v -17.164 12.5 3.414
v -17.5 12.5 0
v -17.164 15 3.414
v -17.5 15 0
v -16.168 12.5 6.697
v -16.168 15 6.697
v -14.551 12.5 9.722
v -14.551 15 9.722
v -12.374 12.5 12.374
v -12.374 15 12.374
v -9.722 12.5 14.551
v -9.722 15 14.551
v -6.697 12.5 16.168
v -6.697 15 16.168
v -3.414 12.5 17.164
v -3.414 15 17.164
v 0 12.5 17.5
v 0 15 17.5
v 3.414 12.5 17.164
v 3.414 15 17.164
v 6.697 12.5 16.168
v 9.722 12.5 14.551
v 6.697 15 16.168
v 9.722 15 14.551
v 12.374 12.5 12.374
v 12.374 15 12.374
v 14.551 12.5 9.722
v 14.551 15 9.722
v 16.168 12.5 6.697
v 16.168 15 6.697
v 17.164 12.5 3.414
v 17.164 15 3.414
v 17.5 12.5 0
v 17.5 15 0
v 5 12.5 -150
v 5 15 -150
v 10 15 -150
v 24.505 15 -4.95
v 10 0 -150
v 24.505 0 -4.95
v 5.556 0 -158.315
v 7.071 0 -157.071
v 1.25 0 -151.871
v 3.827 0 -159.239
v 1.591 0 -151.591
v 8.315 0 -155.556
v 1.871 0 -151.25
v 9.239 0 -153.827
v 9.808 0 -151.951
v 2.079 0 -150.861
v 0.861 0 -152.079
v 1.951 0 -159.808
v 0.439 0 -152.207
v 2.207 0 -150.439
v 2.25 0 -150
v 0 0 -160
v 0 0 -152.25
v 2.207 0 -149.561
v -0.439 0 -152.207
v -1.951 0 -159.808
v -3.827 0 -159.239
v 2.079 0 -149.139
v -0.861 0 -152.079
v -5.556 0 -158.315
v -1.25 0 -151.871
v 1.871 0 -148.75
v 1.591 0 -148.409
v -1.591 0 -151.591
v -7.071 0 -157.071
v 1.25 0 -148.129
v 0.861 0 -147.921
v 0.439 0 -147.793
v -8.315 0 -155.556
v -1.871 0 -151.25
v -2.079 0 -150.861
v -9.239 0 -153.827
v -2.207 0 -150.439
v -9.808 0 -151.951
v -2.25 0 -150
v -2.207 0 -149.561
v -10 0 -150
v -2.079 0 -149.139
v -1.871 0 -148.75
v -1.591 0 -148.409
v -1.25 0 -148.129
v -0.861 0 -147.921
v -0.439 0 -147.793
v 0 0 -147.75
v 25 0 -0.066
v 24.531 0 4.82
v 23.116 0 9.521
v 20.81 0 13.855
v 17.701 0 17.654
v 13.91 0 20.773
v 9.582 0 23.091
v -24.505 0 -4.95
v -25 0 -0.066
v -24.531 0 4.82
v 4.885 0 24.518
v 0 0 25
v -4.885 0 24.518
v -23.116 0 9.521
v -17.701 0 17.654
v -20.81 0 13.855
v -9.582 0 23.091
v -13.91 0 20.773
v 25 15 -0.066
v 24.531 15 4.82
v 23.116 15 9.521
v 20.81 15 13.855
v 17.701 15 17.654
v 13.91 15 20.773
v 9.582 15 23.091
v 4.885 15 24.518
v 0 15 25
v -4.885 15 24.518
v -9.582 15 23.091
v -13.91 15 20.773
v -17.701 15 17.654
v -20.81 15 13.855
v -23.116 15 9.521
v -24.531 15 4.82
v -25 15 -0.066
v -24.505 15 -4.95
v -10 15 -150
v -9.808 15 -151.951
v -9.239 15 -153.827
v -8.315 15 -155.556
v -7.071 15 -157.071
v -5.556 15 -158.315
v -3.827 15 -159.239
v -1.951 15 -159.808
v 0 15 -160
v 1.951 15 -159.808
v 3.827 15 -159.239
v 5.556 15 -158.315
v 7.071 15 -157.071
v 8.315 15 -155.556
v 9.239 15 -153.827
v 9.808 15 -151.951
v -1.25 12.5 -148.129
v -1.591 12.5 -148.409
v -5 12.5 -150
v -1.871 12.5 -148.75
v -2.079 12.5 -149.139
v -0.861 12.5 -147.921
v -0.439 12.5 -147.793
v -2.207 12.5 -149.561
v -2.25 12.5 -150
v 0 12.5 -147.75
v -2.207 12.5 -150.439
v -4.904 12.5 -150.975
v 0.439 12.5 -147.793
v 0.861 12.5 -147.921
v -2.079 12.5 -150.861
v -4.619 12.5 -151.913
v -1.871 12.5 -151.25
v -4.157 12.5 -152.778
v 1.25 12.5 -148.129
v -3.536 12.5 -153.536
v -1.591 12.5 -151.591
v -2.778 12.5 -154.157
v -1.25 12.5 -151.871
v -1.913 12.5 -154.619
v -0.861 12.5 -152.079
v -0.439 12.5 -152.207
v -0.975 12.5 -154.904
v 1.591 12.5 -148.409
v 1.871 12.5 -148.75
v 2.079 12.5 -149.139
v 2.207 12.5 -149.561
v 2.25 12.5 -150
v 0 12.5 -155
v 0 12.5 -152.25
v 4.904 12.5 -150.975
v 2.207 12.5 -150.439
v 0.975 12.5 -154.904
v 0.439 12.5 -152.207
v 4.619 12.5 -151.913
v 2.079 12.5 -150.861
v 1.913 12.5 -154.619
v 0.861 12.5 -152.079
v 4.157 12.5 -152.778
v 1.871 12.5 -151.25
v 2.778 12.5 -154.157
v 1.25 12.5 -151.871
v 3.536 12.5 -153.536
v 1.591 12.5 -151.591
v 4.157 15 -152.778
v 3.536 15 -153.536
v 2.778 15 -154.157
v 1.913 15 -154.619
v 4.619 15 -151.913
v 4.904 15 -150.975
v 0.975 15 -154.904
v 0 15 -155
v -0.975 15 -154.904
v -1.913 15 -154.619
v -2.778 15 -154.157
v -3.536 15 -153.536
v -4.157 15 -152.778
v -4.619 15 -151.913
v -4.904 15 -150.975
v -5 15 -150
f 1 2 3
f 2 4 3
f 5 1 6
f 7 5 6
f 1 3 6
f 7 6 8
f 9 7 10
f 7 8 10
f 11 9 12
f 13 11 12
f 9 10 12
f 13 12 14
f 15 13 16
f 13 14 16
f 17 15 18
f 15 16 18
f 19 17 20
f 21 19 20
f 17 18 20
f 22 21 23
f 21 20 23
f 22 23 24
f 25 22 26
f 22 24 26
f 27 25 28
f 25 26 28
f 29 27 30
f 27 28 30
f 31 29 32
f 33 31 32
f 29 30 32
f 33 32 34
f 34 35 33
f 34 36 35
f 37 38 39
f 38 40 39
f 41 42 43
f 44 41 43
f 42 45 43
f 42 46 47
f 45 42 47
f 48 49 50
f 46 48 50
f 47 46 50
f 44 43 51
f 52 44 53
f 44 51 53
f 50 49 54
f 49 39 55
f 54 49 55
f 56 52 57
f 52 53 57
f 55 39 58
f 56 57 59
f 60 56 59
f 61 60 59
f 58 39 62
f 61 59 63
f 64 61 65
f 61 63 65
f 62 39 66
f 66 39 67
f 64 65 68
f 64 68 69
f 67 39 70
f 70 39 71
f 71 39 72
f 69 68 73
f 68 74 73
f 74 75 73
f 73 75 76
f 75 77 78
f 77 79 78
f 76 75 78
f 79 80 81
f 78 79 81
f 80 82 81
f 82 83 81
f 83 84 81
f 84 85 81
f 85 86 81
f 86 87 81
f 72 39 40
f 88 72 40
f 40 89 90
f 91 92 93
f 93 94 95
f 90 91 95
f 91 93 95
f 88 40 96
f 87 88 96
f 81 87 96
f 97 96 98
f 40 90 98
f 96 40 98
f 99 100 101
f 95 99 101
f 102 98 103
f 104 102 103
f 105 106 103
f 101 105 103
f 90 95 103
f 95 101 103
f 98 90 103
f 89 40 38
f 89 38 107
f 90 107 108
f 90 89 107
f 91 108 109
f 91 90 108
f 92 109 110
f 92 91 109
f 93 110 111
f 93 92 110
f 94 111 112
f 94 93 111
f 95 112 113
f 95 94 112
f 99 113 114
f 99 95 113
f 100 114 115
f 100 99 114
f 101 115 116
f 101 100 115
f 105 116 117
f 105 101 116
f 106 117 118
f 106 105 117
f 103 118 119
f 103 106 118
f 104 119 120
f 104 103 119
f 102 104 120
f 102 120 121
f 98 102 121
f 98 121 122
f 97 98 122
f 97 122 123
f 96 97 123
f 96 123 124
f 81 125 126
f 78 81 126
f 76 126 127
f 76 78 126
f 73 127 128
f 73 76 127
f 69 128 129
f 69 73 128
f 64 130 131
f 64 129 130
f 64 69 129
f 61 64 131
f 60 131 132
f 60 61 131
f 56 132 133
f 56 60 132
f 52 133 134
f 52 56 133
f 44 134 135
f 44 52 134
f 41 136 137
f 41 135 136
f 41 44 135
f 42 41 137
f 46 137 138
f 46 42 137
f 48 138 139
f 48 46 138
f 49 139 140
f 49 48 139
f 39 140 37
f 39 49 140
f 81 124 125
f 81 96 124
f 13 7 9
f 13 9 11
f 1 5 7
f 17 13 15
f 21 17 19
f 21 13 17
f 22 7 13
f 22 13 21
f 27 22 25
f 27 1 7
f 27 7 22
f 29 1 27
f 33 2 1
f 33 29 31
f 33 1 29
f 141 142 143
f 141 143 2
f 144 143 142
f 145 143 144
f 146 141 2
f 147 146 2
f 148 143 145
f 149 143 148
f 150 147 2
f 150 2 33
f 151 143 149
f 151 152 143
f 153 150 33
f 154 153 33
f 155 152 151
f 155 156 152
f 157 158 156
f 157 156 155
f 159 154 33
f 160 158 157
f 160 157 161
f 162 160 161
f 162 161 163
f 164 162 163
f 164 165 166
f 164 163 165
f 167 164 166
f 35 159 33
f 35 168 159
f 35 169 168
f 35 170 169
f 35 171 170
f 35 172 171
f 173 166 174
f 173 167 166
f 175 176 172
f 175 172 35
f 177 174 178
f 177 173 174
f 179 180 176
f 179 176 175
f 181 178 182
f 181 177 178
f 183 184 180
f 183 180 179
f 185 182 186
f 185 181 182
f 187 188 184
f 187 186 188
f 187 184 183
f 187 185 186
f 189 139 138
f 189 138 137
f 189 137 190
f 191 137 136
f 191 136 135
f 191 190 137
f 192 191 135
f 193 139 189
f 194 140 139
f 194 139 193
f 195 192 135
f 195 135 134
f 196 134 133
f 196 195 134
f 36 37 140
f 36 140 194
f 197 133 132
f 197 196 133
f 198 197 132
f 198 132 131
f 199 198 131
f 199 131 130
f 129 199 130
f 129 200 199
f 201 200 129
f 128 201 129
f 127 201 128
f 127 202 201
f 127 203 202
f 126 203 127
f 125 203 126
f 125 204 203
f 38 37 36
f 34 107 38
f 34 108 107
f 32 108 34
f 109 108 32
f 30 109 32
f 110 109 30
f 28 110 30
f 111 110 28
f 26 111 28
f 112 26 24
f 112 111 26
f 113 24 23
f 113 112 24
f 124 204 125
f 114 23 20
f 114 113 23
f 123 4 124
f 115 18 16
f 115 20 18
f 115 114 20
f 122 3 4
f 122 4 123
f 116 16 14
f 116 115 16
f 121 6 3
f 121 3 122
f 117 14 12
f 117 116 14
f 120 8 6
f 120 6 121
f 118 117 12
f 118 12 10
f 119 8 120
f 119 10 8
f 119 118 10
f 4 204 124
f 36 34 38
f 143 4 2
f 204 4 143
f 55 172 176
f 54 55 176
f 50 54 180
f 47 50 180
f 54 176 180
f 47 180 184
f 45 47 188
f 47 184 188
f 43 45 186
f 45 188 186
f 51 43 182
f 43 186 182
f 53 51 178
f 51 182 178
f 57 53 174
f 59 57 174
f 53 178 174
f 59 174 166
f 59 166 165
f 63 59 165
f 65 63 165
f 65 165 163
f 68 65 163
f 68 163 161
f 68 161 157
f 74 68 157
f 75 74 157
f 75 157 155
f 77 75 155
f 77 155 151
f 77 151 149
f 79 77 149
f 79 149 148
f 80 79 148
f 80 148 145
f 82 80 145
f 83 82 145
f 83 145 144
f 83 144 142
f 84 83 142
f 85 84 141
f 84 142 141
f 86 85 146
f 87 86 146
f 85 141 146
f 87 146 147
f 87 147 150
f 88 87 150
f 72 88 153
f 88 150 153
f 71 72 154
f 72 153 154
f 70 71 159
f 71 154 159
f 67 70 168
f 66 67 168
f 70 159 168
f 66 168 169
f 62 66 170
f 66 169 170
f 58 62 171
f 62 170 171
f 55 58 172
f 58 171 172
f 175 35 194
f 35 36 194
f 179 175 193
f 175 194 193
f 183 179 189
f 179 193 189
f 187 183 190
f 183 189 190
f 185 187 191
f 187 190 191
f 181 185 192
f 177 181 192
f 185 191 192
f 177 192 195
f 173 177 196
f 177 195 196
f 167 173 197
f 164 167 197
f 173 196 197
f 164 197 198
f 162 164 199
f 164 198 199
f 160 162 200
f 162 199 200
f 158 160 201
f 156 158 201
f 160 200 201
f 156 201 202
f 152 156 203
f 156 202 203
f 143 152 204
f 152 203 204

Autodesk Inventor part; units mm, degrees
ref_plane "YZ Plane" through (0, 0, 0) normal (1, 0, 0) x (0, 1, 0)
ref_plane "XZ Plane" through (0, 0, 0) normal (0, 1, 0) x (-1, 0, 0)
ref_plane "XY Plane" through (0, 0, 0) normal (0, 0, 1) x (1, 0, 0)
sketch "Sketch1" plane through (0, 0, 0) normal (0, 1, 0) x (-1, 0, 0)
  circle A0 centre (0, 0) radius 25
  line L0 (0, 0) -> (0, -150)
  circle A1 centre (0, -150) radius 10
  line L1 (0, 0) -> (25, 0)
  line L2 (0, -150) -> (10, -150)
  line L3 (0, -150) -> (-10, -150)
  line L4 (0, 0) -> (-25, 0)
  line L5 (25, 0) -> (10, -150)
  line L6 (-25, 0) -> (-10, -150)
  dimension "d0" = 50
  dimension "d1" = 150
  dimension "d2" = 20
extrude "Extrusion1" add sketch "Sketch1" along normal blind 15
sketch "Sketch2" plane through (0, 15, 0) normal (0, 1, 0) x (1, 0, 0)
  circle A0 centre (0, 0) radius 17.5
  arc A1 (10, 150) -> (-10, 150) centre (0, 150) ccw projected
  circle A2 centre (0, 150) radius 5
  line L0 (0, 0) -> (-17.5, 0)
  line L1 (0, 0) -> (17.5, 0)
  line L2 (0, 150) -> (-5, 150)
  line L3 (0, 150) -> (5, 150)
  line L4 (-17.5, 0) -> (-5, 150)
  line L5 (5, 150) -> (17.5, 0)
  dimension "d5" = 35
  dimension "d6" = 10
extrude "Extrusion2" cut sketch "Sketch2" against normal blind 2.5 contours L0 L1 A0 | L4 A0 L5 L1 L0 | L4 A2 L5 A0 | L2 L3 A2 | A2 L3 L2
sketch "Sketch3" plane through (0, 12.5, 0) normal (0, 1, 0) x (1, 0, 0)
  arc A0 (5, 150) -> (-5, 150) centre (0, 150) ccw projected
  circle A1 centre (0, 150) radius 2.25
  point P0 (0, 0)
  dimension "d9" = 4.5
extrude "Extrusion3" cut sketch "Sketch3" against normal blind 12.5
properties part number "Delta_Arm"
